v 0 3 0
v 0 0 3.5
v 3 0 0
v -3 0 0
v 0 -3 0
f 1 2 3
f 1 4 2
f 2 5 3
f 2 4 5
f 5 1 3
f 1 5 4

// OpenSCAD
$fn = 4;
$fs = 0.5;
E = 0.01;

INCH = 25.4;
GAP = 0.5;
BACK_R = INCH / 8 + GAP;
BACK_H = INCH / 16 + GAP;

module round_it() {
  minkowski() {
    cylinder(r1=3, r2=0, h=3.5);
    child(0);
  }
}

difference() {
  round_it() {
    linear_extrude(0.1)
      import("mof-spark.dxf");
  }
  # translate([19, 20, BACK_H / 2 - E])
    cylinder(r=BACK_R, h=BACK_H, center=true, $fn=16);
}

echo("Back diameter", BACK_R * 2);
